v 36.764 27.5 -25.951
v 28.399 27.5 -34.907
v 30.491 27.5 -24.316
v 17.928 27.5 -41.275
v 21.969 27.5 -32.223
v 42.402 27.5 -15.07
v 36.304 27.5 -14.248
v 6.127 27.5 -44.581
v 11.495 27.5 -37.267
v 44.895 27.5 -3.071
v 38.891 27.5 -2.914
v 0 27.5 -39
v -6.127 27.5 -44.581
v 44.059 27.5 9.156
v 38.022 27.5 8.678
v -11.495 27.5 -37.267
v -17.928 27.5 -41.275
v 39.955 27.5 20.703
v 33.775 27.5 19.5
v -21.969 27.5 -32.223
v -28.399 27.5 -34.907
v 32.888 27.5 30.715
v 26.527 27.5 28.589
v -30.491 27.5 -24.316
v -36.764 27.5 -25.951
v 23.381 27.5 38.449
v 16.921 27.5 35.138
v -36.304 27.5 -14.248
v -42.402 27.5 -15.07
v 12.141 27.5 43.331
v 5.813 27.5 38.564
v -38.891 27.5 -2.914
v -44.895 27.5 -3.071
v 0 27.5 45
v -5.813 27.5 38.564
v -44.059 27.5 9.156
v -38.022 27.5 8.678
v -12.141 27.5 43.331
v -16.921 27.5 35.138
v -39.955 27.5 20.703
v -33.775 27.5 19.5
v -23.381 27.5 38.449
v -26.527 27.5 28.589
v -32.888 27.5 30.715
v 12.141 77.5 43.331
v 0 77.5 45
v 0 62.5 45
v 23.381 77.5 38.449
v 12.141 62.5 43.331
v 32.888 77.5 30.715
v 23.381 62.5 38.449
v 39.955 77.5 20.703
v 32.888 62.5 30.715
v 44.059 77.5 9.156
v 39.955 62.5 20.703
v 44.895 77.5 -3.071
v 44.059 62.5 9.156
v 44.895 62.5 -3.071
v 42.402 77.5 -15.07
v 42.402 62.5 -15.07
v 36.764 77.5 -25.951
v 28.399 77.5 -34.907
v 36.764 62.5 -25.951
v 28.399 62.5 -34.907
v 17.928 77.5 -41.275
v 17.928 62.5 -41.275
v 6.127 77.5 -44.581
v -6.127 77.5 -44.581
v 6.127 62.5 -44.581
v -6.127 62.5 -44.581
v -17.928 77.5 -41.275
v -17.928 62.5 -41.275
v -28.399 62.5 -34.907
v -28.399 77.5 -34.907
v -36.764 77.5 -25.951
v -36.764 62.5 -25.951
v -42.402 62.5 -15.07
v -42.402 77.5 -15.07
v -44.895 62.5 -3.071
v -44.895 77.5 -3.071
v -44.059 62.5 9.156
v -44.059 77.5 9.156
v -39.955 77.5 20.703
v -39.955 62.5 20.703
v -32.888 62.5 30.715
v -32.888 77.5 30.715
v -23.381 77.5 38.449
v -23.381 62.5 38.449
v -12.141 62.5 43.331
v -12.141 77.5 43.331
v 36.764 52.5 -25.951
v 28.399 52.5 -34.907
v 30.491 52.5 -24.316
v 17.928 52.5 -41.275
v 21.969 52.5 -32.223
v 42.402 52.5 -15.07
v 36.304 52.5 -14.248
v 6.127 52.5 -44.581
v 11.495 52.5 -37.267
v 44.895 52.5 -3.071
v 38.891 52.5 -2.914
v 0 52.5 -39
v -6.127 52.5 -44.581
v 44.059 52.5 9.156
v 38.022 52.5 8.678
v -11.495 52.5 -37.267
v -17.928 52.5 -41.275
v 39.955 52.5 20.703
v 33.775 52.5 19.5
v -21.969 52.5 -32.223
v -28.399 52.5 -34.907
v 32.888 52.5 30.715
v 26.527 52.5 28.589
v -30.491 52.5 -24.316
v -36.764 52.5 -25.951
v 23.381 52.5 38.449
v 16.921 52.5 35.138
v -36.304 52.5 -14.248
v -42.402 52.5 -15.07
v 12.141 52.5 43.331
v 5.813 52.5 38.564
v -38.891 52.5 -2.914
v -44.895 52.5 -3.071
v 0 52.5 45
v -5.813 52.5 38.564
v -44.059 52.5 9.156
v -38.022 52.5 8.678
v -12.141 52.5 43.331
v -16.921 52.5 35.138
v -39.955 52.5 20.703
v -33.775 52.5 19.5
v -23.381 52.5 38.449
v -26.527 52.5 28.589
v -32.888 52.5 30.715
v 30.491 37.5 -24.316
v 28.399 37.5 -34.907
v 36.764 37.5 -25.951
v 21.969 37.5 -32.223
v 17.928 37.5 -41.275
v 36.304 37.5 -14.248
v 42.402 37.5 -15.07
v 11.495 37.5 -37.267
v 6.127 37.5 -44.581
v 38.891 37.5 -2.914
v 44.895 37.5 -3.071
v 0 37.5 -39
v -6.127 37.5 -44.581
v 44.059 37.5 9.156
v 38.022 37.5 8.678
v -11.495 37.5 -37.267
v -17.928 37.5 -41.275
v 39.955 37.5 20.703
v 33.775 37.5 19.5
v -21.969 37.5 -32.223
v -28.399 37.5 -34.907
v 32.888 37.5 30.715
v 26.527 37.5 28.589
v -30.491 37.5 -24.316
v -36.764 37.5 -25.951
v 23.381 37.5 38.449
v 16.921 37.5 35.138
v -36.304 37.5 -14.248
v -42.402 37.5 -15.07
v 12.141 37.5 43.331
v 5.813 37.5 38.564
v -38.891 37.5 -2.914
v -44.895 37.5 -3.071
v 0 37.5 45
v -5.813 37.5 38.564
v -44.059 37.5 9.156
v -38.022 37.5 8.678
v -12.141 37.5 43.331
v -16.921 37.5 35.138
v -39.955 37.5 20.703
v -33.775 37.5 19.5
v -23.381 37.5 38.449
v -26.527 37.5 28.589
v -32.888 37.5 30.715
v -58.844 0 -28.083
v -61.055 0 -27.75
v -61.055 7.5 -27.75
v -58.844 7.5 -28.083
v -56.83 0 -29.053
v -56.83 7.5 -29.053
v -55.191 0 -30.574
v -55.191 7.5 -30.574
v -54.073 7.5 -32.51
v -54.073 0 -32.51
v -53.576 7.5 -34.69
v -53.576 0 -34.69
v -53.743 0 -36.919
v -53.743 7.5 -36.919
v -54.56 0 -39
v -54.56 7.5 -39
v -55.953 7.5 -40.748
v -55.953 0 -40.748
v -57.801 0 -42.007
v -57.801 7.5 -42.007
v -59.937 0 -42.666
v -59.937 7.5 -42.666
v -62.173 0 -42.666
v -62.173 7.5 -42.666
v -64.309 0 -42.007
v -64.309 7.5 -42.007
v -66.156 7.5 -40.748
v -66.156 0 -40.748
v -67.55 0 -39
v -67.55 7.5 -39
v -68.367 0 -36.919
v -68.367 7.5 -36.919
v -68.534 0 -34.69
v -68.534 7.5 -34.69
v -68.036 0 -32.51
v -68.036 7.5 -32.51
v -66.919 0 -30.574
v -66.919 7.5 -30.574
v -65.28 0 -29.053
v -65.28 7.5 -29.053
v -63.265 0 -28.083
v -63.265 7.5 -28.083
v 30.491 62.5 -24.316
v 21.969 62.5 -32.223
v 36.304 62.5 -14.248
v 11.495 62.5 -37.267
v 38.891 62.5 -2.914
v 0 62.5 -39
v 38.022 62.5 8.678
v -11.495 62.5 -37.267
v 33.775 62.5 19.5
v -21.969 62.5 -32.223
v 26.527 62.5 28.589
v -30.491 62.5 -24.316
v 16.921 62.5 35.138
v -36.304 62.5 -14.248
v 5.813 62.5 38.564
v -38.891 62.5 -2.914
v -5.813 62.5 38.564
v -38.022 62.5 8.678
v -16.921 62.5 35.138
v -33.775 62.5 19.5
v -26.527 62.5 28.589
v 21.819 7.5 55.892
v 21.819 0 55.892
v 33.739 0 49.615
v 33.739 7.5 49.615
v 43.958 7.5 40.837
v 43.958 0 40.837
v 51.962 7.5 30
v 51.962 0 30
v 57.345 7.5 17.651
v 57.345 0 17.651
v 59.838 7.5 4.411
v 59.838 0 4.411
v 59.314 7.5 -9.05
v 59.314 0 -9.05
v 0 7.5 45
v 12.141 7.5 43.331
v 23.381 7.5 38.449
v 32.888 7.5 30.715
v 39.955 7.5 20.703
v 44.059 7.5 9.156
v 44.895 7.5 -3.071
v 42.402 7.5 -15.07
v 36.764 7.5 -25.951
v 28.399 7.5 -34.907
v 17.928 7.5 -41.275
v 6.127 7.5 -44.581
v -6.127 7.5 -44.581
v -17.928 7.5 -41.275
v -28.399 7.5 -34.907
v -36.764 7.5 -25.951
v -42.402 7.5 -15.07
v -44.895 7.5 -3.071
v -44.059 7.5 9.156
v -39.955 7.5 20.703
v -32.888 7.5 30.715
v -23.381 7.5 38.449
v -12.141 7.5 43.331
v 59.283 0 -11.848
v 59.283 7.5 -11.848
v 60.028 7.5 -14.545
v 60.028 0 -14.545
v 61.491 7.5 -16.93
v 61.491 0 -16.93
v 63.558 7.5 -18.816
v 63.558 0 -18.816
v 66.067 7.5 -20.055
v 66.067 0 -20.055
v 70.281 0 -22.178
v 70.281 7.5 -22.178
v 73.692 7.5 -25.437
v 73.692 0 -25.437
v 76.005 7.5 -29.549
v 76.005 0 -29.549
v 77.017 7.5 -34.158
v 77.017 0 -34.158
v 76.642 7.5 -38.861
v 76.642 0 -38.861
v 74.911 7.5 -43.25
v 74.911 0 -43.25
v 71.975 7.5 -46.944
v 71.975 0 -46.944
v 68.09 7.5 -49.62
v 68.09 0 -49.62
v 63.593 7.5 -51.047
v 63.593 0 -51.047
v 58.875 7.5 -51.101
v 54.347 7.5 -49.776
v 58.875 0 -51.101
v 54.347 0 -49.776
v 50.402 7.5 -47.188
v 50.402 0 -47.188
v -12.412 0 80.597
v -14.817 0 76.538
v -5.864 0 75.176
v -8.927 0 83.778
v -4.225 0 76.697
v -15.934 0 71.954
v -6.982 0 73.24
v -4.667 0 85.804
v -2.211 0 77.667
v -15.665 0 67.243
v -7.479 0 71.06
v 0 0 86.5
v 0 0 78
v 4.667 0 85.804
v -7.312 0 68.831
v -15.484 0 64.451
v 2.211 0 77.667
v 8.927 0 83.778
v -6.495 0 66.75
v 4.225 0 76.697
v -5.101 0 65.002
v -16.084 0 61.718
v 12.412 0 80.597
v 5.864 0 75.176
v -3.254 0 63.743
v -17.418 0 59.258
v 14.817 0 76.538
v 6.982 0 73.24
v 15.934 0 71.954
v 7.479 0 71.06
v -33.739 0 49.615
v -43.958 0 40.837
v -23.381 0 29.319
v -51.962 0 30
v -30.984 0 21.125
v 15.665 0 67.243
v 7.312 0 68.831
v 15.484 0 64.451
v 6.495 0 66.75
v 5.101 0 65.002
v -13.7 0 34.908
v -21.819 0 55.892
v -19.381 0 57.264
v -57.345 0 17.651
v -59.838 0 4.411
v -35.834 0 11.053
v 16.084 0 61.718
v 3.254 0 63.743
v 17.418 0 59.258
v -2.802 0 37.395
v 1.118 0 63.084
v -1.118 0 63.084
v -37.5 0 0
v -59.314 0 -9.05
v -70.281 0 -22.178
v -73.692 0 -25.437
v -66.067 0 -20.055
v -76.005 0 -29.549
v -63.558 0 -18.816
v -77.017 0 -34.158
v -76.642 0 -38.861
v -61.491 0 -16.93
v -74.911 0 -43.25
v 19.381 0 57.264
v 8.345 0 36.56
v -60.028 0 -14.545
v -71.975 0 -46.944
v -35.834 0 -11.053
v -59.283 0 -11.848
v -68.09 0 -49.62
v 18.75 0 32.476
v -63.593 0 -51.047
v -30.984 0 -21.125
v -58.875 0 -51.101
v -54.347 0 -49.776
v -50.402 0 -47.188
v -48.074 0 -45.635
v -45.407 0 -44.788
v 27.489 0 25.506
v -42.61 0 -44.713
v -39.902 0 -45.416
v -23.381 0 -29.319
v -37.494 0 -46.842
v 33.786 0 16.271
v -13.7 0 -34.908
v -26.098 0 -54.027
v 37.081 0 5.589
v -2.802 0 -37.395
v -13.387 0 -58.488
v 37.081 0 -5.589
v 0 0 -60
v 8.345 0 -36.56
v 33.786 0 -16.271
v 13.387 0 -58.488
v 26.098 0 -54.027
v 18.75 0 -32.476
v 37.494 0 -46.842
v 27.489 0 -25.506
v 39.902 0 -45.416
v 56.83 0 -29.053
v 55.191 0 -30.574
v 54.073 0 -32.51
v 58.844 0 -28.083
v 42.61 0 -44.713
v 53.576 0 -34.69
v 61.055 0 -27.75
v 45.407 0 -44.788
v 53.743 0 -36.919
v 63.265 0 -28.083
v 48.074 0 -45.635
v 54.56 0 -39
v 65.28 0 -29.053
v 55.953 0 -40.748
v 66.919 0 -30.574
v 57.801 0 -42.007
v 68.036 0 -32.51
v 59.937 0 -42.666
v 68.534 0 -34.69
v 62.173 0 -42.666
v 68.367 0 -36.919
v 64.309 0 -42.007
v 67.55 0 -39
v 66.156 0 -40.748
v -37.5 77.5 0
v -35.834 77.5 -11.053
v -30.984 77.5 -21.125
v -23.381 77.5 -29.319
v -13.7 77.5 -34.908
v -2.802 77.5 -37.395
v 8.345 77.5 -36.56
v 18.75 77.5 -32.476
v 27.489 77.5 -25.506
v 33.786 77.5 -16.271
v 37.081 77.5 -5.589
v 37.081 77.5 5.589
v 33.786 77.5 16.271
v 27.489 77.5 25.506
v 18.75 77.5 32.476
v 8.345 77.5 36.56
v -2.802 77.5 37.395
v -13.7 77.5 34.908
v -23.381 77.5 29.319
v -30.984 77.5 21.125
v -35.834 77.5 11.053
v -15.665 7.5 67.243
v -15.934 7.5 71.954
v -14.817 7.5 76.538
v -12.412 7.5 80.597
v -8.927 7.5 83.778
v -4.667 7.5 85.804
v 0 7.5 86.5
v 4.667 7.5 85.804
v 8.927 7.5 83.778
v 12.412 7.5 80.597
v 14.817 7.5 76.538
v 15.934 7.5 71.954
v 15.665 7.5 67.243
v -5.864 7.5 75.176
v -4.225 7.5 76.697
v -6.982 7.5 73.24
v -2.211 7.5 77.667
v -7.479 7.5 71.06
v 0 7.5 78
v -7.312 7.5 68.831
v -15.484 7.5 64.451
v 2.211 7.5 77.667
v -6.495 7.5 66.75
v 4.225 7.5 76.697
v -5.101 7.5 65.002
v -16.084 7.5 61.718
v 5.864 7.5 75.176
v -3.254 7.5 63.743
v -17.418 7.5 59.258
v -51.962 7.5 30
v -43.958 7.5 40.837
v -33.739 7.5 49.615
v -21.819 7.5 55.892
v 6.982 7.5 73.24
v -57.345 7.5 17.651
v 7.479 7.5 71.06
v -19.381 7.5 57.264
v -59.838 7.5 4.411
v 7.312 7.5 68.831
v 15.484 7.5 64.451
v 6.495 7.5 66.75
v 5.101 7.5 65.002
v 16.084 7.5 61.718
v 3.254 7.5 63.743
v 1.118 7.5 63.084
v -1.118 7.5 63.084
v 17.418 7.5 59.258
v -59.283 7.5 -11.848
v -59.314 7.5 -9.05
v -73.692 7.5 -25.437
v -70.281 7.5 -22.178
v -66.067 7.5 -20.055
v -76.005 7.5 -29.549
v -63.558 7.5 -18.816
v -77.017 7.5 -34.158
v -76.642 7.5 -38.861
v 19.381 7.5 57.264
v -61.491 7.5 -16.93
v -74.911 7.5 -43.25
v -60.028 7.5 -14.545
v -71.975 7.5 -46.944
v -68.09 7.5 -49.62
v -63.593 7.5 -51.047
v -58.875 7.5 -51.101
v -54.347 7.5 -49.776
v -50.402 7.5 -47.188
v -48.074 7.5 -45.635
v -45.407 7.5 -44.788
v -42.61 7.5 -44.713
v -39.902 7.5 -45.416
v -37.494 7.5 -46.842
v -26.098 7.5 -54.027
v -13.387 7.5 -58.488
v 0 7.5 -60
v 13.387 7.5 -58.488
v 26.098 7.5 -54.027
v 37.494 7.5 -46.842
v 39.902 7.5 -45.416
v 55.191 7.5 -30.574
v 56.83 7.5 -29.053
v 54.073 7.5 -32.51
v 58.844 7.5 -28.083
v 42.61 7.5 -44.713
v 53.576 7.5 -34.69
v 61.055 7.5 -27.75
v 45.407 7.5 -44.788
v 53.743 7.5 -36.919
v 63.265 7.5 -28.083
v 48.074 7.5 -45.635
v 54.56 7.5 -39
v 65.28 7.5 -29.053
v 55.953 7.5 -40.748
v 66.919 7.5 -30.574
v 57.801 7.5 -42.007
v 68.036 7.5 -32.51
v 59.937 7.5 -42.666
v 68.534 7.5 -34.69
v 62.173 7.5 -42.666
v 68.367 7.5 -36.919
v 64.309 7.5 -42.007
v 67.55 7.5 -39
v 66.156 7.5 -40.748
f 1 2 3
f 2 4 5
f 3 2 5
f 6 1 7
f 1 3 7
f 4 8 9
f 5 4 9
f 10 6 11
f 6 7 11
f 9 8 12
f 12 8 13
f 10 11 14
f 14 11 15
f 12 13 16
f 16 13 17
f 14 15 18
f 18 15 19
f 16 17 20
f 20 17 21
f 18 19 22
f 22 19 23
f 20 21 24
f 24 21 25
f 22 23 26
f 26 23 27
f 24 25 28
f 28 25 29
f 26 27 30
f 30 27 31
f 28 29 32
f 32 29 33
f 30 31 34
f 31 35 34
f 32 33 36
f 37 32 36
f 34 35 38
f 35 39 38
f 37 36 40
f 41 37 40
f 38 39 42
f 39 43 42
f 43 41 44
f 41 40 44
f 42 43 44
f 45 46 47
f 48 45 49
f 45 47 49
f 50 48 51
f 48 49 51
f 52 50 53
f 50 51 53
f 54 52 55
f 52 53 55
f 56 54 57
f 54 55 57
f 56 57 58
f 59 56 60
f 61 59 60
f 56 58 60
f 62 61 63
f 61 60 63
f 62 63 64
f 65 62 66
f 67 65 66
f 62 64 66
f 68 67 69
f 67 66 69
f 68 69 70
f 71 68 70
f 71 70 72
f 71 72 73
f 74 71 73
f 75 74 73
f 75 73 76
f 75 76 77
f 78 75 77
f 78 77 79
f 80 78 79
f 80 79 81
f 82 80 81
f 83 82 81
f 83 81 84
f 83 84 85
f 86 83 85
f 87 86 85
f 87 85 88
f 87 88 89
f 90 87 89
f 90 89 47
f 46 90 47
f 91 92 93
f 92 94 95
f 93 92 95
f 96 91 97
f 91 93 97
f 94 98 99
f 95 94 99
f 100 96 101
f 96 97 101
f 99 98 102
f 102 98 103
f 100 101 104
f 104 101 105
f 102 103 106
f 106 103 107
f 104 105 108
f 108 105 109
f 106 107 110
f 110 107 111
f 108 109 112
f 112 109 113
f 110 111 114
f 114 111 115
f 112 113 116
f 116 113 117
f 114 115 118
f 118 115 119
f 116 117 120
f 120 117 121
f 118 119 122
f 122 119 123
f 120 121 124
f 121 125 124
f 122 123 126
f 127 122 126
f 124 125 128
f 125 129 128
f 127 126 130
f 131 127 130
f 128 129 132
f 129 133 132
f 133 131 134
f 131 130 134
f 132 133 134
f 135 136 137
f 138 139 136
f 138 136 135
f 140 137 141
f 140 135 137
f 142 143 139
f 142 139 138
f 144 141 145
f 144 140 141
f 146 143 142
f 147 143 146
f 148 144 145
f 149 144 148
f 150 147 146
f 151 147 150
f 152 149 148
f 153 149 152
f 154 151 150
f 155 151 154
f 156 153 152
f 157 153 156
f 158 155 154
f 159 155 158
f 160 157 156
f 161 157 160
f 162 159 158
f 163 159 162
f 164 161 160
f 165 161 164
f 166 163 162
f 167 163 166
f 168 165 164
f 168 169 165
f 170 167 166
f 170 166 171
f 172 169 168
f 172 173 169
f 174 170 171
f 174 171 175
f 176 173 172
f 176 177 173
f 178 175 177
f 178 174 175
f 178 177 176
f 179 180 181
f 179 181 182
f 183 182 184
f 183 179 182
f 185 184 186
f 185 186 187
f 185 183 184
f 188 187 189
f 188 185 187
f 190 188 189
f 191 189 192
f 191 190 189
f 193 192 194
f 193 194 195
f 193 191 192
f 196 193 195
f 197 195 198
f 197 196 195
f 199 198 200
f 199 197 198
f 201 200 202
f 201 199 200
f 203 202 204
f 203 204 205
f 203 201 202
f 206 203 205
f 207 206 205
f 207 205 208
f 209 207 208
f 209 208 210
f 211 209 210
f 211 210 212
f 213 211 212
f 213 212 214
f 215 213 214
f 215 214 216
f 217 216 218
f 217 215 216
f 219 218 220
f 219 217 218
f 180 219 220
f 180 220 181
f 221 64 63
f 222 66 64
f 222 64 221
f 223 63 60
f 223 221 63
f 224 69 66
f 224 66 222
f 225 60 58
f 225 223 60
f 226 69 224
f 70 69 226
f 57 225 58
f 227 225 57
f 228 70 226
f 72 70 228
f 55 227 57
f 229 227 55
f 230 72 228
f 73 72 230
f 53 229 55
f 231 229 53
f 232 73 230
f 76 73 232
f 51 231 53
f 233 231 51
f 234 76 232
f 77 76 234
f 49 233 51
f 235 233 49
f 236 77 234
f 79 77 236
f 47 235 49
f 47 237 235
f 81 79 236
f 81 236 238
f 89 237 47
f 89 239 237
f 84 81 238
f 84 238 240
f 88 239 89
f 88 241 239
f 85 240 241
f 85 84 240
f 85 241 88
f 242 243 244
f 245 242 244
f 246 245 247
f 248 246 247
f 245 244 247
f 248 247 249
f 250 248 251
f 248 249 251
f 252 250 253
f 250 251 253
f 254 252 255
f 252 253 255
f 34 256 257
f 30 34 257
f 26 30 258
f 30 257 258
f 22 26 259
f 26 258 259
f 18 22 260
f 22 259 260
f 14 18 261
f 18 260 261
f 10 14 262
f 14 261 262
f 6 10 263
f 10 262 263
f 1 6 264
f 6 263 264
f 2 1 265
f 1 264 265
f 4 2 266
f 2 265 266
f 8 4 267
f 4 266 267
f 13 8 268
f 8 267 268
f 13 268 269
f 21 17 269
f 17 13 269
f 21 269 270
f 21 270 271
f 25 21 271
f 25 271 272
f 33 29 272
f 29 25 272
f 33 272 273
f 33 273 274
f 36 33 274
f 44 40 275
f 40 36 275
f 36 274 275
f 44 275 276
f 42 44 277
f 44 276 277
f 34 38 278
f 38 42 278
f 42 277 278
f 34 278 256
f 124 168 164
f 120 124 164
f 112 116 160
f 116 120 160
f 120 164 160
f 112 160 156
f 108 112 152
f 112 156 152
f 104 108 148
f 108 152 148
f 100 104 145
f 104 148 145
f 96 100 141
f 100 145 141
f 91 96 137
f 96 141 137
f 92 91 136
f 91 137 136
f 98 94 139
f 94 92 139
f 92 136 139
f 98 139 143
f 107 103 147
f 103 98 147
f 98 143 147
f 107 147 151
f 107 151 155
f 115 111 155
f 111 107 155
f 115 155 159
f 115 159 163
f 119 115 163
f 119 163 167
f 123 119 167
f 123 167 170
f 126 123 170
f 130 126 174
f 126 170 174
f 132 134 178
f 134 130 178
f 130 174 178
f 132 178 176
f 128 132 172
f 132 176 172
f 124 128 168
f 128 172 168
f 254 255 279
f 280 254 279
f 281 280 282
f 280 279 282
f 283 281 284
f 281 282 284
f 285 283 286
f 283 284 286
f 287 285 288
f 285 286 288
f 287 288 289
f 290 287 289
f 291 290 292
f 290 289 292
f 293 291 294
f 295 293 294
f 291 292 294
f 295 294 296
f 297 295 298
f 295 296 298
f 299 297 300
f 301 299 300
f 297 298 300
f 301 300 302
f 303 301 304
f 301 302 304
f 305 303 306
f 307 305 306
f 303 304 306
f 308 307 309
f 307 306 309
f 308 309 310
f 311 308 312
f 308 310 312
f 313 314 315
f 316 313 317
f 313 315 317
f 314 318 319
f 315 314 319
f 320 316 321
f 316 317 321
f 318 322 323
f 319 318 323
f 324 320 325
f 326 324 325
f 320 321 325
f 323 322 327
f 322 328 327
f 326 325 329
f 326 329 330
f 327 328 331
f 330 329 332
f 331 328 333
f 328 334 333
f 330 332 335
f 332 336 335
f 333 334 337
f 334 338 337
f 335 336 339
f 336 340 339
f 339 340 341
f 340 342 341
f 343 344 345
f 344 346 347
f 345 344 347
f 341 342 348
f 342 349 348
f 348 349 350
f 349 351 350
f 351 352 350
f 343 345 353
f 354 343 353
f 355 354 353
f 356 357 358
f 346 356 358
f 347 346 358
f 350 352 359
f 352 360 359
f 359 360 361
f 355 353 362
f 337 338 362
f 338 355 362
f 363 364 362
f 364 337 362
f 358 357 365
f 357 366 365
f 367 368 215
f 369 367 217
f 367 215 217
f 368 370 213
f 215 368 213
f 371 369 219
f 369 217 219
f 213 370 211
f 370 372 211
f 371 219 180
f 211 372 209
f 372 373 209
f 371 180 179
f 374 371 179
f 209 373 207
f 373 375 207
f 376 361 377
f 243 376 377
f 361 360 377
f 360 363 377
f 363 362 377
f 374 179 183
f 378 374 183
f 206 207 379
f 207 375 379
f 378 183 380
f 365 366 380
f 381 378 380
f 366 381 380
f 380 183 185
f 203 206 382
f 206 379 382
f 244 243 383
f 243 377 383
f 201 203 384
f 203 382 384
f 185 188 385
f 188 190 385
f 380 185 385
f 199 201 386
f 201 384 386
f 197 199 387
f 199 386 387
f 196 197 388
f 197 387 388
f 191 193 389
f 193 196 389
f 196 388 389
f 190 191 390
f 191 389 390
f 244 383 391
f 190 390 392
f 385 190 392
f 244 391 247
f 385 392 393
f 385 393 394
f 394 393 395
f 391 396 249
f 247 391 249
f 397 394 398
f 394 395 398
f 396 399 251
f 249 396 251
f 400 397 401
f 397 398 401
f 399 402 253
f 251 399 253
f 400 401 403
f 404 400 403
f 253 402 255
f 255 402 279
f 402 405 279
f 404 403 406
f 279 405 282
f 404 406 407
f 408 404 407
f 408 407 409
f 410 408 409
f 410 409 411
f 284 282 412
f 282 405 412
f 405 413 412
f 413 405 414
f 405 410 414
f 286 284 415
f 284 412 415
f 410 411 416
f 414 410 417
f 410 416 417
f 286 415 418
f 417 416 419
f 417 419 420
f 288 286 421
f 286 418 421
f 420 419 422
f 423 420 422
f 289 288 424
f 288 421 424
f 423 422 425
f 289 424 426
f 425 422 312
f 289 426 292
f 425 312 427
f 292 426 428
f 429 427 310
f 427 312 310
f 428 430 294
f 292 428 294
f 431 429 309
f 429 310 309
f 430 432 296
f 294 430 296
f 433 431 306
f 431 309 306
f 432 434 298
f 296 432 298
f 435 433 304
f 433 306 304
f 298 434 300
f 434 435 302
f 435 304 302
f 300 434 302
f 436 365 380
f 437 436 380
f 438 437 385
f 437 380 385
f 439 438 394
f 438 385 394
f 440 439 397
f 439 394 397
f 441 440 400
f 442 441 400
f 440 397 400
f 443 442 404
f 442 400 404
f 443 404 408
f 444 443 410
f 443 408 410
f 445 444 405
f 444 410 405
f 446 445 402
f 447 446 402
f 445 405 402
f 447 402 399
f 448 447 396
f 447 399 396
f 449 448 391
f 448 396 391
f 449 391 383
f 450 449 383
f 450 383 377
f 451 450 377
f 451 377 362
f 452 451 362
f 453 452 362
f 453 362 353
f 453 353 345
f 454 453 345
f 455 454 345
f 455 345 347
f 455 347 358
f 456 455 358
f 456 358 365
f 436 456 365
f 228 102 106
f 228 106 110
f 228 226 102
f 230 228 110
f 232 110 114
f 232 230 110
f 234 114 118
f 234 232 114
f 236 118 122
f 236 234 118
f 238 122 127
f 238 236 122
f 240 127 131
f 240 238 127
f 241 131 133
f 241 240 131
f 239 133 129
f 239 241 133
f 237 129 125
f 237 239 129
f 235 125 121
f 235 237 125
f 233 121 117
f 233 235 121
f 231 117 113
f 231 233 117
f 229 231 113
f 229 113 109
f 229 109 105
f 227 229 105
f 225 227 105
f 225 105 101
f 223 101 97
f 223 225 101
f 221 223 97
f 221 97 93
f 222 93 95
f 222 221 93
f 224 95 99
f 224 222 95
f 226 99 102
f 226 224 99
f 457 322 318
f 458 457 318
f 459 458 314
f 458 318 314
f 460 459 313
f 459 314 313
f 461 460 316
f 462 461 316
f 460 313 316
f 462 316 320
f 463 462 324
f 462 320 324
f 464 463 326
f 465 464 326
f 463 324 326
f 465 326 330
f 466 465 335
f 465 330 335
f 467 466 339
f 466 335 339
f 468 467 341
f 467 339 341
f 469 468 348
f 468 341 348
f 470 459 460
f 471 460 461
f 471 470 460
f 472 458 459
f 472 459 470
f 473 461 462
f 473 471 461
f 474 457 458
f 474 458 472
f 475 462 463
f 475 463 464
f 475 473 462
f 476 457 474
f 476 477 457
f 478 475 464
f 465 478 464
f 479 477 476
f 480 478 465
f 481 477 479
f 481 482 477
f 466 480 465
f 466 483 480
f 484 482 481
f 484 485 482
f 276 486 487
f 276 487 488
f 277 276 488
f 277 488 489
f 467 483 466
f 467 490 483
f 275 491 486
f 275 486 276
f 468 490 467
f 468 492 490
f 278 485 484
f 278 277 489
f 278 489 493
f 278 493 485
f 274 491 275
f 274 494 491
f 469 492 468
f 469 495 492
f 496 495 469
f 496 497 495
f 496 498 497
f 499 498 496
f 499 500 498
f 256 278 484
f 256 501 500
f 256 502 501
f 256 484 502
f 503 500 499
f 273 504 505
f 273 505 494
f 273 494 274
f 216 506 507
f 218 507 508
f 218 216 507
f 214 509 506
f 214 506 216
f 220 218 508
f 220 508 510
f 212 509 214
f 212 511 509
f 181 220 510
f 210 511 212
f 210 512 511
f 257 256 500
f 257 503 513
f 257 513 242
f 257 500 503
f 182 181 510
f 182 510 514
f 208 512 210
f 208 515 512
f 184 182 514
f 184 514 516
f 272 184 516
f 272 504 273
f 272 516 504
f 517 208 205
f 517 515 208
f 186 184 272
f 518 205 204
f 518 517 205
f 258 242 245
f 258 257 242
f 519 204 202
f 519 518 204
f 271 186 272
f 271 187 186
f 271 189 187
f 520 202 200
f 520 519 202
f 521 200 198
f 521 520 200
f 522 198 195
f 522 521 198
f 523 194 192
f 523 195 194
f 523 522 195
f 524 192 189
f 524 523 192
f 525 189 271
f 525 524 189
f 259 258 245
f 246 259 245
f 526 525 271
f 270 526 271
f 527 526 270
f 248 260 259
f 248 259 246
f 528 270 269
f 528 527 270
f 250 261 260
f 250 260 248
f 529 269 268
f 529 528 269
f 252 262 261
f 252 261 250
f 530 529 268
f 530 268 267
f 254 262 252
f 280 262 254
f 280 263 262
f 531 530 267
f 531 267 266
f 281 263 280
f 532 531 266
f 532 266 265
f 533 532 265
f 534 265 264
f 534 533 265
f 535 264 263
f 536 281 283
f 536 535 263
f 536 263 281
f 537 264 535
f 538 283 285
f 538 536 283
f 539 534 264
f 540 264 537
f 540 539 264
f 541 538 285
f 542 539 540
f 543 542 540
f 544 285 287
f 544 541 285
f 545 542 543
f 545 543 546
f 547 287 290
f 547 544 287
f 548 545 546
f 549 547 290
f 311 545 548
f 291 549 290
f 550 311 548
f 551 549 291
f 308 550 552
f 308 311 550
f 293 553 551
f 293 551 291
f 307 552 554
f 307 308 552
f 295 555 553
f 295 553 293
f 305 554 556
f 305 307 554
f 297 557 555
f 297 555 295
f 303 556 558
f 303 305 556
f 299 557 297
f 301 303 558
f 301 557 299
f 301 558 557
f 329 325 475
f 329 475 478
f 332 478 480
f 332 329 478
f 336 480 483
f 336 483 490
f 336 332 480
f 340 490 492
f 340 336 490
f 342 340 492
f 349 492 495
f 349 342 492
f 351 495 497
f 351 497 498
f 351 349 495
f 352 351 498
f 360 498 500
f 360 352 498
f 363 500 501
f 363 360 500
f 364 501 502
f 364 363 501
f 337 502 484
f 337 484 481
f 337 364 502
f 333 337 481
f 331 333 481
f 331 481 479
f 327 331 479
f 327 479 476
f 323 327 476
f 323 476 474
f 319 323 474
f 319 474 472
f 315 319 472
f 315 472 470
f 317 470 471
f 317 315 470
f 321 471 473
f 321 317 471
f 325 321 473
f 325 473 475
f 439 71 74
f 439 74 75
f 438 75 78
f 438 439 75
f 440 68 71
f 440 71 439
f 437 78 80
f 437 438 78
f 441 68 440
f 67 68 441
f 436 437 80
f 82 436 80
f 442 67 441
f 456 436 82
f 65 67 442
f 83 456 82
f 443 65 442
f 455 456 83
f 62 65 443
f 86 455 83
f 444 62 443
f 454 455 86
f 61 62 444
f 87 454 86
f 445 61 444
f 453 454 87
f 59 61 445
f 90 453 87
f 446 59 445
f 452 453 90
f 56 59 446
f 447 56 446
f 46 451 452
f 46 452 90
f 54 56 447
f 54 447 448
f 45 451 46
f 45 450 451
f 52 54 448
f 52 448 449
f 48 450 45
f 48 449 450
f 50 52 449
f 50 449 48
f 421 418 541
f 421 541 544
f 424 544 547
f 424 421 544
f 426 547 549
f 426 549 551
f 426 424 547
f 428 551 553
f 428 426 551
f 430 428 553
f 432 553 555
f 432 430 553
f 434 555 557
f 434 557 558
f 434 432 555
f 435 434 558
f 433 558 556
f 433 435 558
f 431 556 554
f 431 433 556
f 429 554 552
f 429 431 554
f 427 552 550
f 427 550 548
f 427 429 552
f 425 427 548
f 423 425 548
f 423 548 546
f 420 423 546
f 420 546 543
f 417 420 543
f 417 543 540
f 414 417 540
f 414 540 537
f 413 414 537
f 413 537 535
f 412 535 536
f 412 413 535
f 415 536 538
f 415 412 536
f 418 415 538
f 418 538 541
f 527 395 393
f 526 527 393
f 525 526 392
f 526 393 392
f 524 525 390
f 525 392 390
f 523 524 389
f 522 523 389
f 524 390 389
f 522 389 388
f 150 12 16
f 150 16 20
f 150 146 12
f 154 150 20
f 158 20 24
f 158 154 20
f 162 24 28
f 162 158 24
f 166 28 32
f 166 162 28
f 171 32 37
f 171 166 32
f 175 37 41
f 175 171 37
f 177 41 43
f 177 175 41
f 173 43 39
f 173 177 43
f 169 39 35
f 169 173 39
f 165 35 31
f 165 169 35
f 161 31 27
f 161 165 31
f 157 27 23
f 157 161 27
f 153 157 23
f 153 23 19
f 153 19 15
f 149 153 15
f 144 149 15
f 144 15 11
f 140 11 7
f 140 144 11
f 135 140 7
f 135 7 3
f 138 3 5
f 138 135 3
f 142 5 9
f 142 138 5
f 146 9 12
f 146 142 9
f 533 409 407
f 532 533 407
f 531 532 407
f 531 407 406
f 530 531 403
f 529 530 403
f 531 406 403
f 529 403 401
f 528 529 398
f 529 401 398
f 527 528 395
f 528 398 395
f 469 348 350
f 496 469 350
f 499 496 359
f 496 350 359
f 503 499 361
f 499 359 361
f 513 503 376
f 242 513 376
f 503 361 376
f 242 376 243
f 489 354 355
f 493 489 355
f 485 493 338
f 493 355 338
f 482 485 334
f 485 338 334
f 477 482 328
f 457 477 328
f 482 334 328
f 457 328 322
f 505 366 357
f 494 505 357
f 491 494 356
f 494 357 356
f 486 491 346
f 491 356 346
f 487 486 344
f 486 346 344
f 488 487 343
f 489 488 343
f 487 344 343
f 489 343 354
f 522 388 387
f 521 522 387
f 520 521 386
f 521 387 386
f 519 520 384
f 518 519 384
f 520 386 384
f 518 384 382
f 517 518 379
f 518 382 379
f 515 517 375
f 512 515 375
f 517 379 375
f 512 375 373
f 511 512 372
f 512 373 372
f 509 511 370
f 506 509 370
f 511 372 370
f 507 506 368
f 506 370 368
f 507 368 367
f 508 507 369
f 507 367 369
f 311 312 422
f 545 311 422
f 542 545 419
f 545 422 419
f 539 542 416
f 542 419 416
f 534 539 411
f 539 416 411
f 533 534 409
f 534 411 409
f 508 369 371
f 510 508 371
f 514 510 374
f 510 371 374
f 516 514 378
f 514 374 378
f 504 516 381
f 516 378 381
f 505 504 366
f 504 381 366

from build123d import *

# Parameters (mm, degrees)
SKETCH1_R           = 7.5
BOSS_EXTRUDE1_DEPTH = 7.5
SKETCH2_R           = 45
BOSS_EXTRUDE2_DEPTH = 70
SKETCH3_W           = 6
SKETCH3_H           = 10
HOLE1_D             = 75


with BuildPart() as part:
    # Sketch1 → Boss-Extrude1 (new body)
    with BuildSketch(Plane(origin=(0, 0, 0), x_dir=(1, 0, 0), z_dir=(0, 1, 0))):
        with BuildLine():
            ThreePointArc((21.819107759, -55.892097264), (51.961524227, -30), (59.313529981, 9.050147025))
            ThreePointArc((59.313529981, 9.050147025), (60.675902532, 15.788685813), (66.066684717, 20.055233762))
            ThreePointArc((66.066684717, 20.055233762), (74.911197427, 43.25), (50.401684275, 47.187810428))
            ThreePointArc((50.401684275, 47.187810428), (44.011354273, 44.652530083), (37.494422222, 46.841950239))
            ThreePointArc((37.494422222, 46.841950239), (0, 60), (-37.494422222, 46.841950239))
            ThreePointArc((-37.494422222, 46.841950239), (-44.011354273, 44.652530083), (-50.401684275, 47.187810428))
            ThreePointArc((-50.401684275, 47.187810428), (-74.911197427, 43.25), (-66.066684717, 20.055233762))
            ThreePointArc((-66.066684717, 20.055233762), (-60.675902532, 15.788685813), (-59.313529981, 9.050147025))
            ThreePointArc((-59.313529981, 9.050147025), (-51.961524227, -30), (-21.819107759, -55.892097264))
            ThreePointArc((-21.819107759, -55.892097264), (-16.664548259, -60.441215897), (-15.665000442, -67.24304419))
            ThreePointArc((-15.665000442, -67.24304419), (0, -86.5), (15.665000442, -67.24304419))
            ThreePointArc((15.665000442, -67.24304419), (16.664548259, -60.441215897), (21.819107759, -55.892097264))
        make_face()
        with Locations(Location((-61.054790967, 35.25, 0), (0, 0, 270))):
            Circle(SKETCH1_R, mode=Mode.SUBTRACT)
        with Locations(Location((61.054790967, 35.25, 0), (0, 0, 270))):
            Circle(SKETCH1_R, mode=Mode.SUBTRACT)
        with Locations(Location((0, -70.5, 0), (0, 0, 270))):
            Circle(SKETCH1_R, mode=Mode.SUBTRACT)
    extrude(amount=BOSS_EXTRUDE1_DEPTH)

    # Sketch2 → Boss-Extrude2 (add)
    with BuildSketch(Plane(origin=(0, 7.5, 0), x_dir=(1, 0, 0), z_dir=(0, 1, 0))):
        with Locations(Location((0, 0, 0), (0, 0, 270))):
            Circle(SKETCH2_R)
    extrude(amount=BOSS_EXTRUDE2_DEPTH)

    # Sketch3 → Cut-Revolve2 (revolve, cut)
    with BuildSketch(Plane.XY, mode=Mode.PRIVATE) as cut_revolve2_sk:
        with Locations((42, 57.5)):
            Rectangle(SKETCH3_W, SKETCH3_H)
        with Locations((42, 32.5)):
            Rectangle(SKETCH3_W, SKETCH3_H)
    revolve(cut_revolve2_sk.sketch.rotate(Axis((0, 0, 0), (0, 1, 0)), 90), axis=Axis((0, 0, 0), (0, 1, 0)), mode=Mode.SUBTRACT)

    # Hole1 (through all)
    with Locations(Plane(origin=(0, 77.5, 0), x_dir=(1, 0, 0), z_dir=(0, 1, 0))):
        with Locations((0, 0)):
            Hole(HOLE1_D / 2)


solid = part.part
